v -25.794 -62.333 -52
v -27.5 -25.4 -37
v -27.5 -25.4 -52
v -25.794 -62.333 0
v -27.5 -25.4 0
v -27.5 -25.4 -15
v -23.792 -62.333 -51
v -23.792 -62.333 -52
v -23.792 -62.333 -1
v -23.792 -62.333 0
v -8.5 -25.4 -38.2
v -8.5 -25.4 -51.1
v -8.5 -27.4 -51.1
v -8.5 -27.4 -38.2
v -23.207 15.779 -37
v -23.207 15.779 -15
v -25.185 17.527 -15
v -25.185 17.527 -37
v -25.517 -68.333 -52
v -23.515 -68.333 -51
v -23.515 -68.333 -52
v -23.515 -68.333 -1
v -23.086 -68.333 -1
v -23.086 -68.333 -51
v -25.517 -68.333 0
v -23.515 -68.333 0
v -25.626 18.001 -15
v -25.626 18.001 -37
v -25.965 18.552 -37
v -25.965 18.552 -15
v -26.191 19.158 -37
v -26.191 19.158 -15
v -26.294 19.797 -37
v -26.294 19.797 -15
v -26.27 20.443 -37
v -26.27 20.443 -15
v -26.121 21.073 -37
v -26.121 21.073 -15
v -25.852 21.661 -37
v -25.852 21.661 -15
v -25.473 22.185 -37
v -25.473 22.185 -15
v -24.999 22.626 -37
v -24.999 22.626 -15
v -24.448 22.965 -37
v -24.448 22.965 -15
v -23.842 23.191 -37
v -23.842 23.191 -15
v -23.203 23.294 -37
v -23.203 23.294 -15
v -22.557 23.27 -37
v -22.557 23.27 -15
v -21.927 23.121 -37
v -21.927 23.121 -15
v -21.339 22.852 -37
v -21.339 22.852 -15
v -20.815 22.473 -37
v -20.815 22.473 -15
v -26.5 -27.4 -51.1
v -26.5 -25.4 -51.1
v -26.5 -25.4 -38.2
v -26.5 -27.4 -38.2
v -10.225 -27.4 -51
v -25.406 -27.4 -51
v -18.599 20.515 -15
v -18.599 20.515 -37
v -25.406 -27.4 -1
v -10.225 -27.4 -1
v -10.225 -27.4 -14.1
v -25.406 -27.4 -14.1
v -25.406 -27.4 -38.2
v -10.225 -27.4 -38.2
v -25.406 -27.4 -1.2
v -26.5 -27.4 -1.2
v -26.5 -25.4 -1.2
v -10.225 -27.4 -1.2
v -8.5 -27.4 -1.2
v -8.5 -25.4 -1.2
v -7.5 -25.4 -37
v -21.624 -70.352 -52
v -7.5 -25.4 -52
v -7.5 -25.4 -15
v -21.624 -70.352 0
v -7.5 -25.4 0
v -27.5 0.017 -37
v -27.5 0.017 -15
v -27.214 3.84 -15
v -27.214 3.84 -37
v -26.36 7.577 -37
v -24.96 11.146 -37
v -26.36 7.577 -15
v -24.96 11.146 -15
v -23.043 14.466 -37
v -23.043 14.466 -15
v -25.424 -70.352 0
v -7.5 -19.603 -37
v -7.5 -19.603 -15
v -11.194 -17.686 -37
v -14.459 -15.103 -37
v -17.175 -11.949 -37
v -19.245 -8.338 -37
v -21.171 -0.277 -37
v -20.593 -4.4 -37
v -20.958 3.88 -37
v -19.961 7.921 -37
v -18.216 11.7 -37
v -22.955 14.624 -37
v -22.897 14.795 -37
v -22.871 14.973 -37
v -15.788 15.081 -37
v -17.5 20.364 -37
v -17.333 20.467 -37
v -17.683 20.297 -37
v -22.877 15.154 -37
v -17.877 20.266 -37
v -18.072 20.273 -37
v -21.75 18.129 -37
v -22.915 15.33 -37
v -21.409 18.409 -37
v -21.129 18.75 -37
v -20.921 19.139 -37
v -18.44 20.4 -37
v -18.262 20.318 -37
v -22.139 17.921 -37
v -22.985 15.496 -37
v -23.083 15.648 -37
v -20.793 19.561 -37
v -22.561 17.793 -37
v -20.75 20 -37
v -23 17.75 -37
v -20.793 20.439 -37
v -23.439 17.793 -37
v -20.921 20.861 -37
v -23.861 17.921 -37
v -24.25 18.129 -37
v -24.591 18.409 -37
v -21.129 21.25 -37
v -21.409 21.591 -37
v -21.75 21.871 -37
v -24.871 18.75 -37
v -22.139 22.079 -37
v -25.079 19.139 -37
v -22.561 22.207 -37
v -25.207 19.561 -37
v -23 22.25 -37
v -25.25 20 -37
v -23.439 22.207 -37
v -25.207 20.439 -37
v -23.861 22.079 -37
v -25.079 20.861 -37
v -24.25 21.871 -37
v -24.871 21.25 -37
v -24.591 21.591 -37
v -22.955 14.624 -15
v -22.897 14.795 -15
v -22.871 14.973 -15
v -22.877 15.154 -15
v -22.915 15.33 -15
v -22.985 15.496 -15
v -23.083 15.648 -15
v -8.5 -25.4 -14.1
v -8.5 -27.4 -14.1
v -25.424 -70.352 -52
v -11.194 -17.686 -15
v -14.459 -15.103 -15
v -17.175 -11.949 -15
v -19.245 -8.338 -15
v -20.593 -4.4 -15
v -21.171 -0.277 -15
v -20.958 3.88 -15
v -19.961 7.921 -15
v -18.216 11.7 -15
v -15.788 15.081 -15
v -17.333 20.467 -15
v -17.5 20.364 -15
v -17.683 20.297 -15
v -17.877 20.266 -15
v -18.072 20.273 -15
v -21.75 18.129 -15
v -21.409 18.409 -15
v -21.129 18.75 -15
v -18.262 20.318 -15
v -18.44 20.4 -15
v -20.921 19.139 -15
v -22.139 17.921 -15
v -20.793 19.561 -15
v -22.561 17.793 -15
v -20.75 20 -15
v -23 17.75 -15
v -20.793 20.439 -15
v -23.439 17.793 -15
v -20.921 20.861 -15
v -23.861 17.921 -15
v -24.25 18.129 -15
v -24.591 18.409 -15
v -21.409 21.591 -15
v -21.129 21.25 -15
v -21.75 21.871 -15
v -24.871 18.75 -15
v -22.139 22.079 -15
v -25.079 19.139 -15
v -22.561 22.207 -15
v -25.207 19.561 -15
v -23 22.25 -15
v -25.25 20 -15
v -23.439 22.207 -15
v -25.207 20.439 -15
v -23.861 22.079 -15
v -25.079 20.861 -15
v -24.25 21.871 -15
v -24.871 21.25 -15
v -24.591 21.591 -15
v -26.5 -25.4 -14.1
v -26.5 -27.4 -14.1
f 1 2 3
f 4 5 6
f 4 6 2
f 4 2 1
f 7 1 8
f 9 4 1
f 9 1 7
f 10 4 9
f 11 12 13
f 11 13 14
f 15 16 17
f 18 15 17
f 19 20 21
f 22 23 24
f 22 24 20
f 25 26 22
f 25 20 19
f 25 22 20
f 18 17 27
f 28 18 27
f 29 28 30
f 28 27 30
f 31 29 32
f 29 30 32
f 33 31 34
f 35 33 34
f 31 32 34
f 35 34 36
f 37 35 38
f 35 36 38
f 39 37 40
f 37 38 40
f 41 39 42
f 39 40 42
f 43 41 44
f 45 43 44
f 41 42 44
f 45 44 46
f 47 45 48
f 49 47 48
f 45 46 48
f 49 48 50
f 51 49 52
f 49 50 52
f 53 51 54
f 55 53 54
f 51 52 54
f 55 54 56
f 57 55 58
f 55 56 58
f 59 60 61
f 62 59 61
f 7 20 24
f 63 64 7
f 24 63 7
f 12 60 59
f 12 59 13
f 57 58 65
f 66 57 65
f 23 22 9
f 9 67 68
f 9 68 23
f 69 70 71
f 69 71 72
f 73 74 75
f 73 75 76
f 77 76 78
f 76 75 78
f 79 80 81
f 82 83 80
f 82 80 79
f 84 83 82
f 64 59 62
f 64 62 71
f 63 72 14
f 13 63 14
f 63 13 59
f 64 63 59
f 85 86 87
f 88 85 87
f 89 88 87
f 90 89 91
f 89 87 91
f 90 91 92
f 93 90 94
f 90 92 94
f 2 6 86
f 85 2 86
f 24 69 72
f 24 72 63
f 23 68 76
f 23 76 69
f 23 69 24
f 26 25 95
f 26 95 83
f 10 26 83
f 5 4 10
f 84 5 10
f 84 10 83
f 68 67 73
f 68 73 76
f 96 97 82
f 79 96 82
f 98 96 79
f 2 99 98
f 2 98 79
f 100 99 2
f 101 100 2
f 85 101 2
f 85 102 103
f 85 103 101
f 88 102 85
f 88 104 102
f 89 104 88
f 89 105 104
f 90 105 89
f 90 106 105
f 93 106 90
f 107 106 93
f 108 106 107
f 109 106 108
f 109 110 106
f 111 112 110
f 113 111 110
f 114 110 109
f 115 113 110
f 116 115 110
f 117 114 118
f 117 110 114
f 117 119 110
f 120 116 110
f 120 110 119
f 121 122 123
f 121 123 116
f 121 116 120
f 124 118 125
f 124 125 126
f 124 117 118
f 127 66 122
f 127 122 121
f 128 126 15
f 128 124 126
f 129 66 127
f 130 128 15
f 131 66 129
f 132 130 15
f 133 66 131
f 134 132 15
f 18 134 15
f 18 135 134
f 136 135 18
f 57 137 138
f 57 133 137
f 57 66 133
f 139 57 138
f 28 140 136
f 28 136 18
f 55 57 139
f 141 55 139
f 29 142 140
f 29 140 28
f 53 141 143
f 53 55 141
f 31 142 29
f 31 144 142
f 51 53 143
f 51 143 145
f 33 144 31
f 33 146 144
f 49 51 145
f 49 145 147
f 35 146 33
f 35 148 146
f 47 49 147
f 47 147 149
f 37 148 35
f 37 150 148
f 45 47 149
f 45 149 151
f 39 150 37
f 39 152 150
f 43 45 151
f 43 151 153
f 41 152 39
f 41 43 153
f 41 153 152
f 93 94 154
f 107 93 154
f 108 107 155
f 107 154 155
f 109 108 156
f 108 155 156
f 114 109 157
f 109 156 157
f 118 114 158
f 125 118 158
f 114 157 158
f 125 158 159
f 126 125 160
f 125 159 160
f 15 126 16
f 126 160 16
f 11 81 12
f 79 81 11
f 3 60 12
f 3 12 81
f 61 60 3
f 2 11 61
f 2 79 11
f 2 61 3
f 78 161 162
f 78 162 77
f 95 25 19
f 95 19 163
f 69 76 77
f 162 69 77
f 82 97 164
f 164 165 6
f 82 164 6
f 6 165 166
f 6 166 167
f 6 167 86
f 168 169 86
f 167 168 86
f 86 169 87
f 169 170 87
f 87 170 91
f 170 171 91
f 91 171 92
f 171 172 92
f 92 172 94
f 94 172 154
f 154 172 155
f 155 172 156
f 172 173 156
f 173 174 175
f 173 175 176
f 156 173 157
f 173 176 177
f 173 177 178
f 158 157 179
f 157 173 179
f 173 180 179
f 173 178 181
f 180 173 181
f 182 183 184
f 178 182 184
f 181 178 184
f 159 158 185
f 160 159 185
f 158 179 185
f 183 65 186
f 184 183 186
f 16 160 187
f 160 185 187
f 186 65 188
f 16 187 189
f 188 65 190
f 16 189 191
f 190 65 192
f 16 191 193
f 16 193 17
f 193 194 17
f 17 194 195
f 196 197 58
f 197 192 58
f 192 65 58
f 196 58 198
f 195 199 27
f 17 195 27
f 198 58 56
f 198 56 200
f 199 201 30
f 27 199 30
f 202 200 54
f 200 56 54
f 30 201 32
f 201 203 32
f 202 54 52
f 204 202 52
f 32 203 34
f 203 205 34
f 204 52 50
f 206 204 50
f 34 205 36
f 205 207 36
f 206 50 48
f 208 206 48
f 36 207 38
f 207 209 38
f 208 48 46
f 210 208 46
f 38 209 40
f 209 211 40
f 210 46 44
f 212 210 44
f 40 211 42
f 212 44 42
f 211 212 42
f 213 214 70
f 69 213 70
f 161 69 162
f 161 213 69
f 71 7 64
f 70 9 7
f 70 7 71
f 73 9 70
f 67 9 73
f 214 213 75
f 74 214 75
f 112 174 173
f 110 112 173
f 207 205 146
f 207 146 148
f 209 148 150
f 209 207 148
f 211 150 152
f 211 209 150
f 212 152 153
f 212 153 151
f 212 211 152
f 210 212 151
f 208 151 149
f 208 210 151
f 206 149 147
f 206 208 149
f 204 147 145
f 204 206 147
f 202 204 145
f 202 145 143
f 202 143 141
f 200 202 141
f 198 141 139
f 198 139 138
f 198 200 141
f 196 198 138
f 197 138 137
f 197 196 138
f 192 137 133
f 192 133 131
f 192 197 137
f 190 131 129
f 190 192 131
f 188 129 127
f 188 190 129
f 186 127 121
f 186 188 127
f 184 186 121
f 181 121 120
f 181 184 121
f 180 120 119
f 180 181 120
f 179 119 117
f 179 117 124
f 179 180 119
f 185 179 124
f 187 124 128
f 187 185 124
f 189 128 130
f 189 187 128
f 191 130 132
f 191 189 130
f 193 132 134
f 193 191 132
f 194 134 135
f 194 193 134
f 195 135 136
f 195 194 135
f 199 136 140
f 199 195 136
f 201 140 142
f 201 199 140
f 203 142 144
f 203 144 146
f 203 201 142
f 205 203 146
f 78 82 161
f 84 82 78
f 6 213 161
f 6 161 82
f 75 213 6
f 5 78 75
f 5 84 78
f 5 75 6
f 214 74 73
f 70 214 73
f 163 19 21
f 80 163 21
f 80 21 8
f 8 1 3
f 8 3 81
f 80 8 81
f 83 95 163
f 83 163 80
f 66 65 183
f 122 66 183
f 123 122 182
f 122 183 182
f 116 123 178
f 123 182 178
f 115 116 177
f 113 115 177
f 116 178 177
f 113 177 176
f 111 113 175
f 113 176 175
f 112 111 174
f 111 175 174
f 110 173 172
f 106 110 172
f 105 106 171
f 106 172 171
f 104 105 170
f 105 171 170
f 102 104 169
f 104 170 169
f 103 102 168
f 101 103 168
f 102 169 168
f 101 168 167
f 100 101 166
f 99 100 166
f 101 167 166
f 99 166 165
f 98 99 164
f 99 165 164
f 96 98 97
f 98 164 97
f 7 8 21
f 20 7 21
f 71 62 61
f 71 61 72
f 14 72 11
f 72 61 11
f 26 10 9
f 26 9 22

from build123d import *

# Parameters (mm, degrees)
BOSS_EXTRUDE1_DEPTH = 52
BOSS_EXTRUDE2_DEPTH = 1
BOSS_EXTRUDE3_START = -52
BOSS_EXTRUDE3_DEPTH = 1
SKETCH4_W           = 18.000000053
SKETCH4_H           = 12.9
SKETCH4_W_2         = 18
CUT_EXTRUDE1_DEPTH  = 2
SKETCH5_R           = 3.3
SKETCH5_R_2         = 2.25
BOSS_EXTRUDE4_DEPTH = 22


with BuildPart() as part:
    # Sketch2 → Boss-Extrude1 (new body)
    with BuildSketch(Plane.XY):
        Polygon((-21.624010924, -70.352088598), (-7.5, -25.4), (-27.5, -25.4), (-25.794353309, -62.332940574), (-23.792221644, -62.332940574), (-25.405503813, -27.4), (-10.224802214, -27.4), (-23.085991045, -68.332940574), (-23.515128079, -68.332940574), (-25.517259745, -68.332940574), (-25.424010924, -70.352088598), align=None)
    extrude(amount=-BOSS_EXTRUDE1_DEPTH)

    # Sketch2<3> → Boss-Extrude2 (add)
    with BuildSketch(Plane.XY):
        Polygon((-23.515128079, -68.332940574), (-23.085991045, -68.332940574), (-10.224802214, -27.4), (-25.405503813, -27.4), align=None)
    extrude(amount=-BOSS_EXTRUDE2_DEPTH)

    # Sketch2<4> → Boss-Extrude3 (add)
    with BuildSketch(Plane.XY.offset(BOSS_EXTRUDE3_START)):
        Polygon((-23.515128079, -68.332940574), (-23.085991045, -68.332940574), (-10.224802214, -27.4), (-25.405503813, -27.4), align=None)
    extrude(amount=BOSS_EXTRUDE3_DEPTH)

    # Sketch4 → Cut-Extrude1 (cut)
    with BuildSketch(Plane.XZ.offset(25.4)):
        with Locations((-17.500000027, -7.65)):
            Rectangle(SKETCH4_W, SKETCH4_H)
        with Locations((-17.5, -44.65)):
            Rectangle(SKETCH4_W_2, SKETCH4_H)
    extrude(amount=CUT_EXTRUDE1_DEPTH, mode=Mode.SUBTRACT)

    # Sketch5 → Boss-Extrude4 (add)
    with BuildSketch(Plane(origin=(0, 0, -15), x_dir=(-1, 0, 0), z_dir=(0, 0, -1))):
        with BuildLine():
            Line((7.5, -22.955849111), (7.5, -25.4))
            Line((7.5, -25.4), (27.5, -25.4))
            Line((27.5, -25.4), (27.5, 0.016796875))
            ThreePointArc((27.5, 0.016796875), (26.360398691, 7.577422908), (23.04284729, 14.466226133))
            ThreePointArc((23.04284729, 14.466226133), (22.876796583, 15.153555184), (23.20688118, 15.778885673))
            Line((23.20688118, 15.778885673), (25.185252728, 17.527214018))
            ThreePointArc((25.185252728, 17.527214018), (20.527214018, 17.814747272), (20.814747272, 22.472785982))
            Line((20.814747272, 22.472785982), (18.598905377, 20.514600122))
            ThreePointArc((18.598905377, 20.514600122), (17.974550182, 20.264645495), (17.333078903, 20.466663618))
            Line((17.333078903, 20.466663618), (15.787974775, 15.080867994))
            ThreePointArc((15.787974775, 15.080867994), (20.592977306, -4.399589042), (7.5, -19.60321364))
            Line((7.5, -19.60321364), (7.5, -22.955849111))
        make_face()
        with Locations((23, 20)):
            Circle(SKETCH5_R)
        with Locations((23, 20)):
            Circle(SKETCH5_R_2, mode=Mode.SUBTRACT)
    extrude(amount=BOSS_EXTRUDE4_DEPTH)


solid = part.part
